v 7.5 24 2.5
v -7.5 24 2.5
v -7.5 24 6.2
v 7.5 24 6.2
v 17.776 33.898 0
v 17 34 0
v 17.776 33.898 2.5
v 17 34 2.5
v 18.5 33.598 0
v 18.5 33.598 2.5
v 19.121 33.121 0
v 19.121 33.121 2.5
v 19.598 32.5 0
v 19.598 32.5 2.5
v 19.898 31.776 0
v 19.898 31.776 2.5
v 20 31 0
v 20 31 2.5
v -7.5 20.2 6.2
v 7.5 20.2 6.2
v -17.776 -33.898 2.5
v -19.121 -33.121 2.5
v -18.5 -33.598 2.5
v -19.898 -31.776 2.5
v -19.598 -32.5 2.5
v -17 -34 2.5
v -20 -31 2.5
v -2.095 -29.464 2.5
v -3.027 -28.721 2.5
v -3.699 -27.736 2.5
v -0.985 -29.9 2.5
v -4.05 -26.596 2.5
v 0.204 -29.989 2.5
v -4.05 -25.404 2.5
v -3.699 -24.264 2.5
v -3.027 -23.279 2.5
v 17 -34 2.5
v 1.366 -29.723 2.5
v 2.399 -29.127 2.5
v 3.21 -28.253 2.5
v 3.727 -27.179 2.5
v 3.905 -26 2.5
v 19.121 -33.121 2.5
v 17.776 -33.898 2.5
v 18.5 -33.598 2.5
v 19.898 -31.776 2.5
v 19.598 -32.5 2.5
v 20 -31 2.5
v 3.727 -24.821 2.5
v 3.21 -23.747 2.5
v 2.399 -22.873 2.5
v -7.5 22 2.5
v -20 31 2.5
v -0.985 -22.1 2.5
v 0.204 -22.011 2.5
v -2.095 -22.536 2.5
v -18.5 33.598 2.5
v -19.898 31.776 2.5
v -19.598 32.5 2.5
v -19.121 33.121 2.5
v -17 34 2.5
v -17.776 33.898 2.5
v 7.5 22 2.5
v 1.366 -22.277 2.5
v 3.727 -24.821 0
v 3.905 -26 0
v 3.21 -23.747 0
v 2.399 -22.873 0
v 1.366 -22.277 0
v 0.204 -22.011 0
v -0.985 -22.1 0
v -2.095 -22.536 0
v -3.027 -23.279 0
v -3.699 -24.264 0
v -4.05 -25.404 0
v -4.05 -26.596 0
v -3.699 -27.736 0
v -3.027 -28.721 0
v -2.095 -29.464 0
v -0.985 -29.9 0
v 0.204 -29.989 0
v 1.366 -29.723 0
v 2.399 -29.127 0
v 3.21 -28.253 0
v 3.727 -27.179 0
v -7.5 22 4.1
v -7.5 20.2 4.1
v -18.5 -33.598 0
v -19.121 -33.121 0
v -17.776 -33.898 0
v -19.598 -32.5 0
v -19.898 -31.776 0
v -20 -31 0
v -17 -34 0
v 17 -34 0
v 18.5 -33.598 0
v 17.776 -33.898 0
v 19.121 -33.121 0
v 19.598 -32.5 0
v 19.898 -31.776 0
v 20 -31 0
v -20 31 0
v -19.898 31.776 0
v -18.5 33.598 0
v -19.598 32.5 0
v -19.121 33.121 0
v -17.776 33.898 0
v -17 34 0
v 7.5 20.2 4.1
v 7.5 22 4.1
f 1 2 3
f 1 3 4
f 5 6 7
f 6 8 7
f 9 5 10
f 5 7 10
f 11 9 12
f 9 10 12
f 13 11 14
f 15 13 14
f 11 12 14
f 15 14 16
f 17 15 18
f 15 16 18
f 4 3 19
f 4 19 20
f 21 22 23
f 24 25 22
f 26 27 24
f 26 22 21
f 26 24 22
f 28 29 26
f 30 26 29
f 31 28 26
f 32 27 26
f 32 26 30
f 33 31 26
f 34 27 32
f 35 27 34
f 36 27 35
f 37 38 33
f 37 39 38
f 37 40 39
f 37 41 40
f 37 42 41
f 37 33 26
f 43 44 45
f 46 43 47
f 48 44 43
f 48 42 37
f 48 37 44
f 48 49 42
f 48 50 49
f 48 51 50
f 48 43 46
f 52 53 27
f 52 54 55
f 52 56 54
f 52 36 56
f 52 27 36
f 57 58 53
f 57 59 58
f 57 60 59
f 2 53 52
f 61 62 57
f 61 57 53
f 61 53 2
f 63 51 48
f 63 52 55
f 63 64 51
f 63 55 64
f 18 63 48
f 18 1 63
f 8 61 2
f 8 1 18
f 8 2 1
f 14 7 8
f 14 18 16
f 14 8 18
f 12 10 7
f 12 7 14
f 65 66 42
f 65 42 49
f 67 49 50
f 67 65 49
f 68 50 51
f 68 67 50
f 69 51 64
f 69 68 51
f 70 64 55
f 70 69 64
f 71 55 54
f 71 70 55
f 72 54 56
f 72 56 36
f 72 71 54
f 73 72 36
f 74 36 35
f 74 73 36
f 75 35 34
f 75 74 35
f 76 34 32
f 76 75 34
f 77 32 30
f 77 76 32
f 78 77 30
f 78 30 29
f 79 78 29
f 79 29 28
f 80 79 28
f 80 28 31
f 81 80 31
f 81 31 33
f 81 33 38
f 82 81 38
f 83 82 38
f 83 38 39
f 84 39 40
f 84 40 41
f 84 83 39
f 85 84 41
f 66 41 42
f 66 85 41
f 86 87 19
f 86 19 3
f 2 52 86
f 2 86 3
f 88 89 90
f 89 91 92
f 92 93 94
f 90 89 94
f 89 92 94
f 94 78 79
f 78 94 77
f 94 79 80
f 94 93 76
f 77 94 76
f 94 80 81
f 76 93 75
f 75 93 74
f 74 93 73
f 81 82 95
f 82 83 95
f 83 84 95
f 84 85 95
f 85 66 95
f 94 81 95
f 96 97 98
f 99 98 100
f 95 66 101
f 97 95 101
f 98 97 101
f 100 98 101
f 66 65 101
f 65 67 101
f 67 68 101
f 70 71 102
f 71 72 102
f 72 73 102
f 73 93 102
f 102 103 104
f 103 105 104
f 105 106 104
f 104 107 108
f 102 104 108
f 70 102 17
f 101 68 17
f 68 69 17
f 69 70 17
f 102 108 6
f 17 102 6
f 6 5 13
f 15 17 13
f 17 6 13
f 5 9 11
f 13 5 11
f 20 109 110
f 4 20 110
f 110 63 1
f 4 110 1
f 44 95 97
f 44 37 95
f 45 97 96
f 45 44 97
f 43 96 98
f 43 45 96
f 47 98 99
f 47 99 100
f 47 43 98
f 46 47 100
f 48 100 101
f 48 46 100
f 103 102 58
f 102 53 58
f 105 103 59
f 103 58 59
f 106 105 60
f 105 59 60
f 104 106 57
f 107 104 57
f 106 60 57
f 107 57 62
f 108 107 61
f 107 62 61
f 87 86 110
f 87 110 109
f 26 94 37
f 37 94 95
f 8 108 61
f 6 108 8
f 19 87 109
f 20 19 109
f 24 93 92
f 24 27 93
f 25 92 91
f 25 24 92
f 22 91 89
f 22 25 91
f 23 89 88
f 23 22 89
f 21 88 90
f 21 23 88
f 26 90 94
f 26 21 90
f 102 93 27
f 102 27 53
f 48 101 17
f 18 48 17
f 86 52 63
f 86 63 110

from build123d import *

# Parameters (mm, degrees)
F0_W     = 40
F0_H     = 68
F0_R     = 4
F1_DEPTH = 2.5
F2_R     = 3
F3_W     = 15
F3_H     = 3.8
F4_DEPTH = 3.7
F5_W     = 1.8
F5_H     = 1.6
F6_DEPTH = 25


with BuildPart() as f1:
    # F0 (on Top) → F1 (new body)
    with BuildSketch(Plane.XY):
        Rectangle(F0_W, F0_H)
        with Locations((-0.09511, -26)):
            Circle(F0_R, mode=Mode.SUBTRACT)
    extrude(amount=F1_DEPTH)

    # F2
    f2_edges = [f1.edges().sort_by_distance(p)[0] for p in [
        (-20, 34, 1.25),
        (20, 34, 1.25),
        (-20, -34, 1.25),
        (20, -34, 1.25),
    ]]
    fillet(f2_edges, radius=F2_R)

    # F3 (on face) → F4 (join)
    with BuildSketch(Plane.XY.offset(2.5)):
        with Locations((0, 22.1)):
            Rectangle(F3_W, F3_H)
    extrude(amount=F4_DEPTH)

    # F5 (on face) → F6 (cut)
    with BuildSketch(Plane(origin=(-7.5, 0, 0), x_dir=(0, -1, 0), z_dir=(-1, 0, 0))):
        with Locations((-21.1, 3.3)):
            Rectangle(F5_W, F5_H)
    extrude(amount=-F6_DEPTH, mode=Mode.SUBTRACT)


solid = f1.part
